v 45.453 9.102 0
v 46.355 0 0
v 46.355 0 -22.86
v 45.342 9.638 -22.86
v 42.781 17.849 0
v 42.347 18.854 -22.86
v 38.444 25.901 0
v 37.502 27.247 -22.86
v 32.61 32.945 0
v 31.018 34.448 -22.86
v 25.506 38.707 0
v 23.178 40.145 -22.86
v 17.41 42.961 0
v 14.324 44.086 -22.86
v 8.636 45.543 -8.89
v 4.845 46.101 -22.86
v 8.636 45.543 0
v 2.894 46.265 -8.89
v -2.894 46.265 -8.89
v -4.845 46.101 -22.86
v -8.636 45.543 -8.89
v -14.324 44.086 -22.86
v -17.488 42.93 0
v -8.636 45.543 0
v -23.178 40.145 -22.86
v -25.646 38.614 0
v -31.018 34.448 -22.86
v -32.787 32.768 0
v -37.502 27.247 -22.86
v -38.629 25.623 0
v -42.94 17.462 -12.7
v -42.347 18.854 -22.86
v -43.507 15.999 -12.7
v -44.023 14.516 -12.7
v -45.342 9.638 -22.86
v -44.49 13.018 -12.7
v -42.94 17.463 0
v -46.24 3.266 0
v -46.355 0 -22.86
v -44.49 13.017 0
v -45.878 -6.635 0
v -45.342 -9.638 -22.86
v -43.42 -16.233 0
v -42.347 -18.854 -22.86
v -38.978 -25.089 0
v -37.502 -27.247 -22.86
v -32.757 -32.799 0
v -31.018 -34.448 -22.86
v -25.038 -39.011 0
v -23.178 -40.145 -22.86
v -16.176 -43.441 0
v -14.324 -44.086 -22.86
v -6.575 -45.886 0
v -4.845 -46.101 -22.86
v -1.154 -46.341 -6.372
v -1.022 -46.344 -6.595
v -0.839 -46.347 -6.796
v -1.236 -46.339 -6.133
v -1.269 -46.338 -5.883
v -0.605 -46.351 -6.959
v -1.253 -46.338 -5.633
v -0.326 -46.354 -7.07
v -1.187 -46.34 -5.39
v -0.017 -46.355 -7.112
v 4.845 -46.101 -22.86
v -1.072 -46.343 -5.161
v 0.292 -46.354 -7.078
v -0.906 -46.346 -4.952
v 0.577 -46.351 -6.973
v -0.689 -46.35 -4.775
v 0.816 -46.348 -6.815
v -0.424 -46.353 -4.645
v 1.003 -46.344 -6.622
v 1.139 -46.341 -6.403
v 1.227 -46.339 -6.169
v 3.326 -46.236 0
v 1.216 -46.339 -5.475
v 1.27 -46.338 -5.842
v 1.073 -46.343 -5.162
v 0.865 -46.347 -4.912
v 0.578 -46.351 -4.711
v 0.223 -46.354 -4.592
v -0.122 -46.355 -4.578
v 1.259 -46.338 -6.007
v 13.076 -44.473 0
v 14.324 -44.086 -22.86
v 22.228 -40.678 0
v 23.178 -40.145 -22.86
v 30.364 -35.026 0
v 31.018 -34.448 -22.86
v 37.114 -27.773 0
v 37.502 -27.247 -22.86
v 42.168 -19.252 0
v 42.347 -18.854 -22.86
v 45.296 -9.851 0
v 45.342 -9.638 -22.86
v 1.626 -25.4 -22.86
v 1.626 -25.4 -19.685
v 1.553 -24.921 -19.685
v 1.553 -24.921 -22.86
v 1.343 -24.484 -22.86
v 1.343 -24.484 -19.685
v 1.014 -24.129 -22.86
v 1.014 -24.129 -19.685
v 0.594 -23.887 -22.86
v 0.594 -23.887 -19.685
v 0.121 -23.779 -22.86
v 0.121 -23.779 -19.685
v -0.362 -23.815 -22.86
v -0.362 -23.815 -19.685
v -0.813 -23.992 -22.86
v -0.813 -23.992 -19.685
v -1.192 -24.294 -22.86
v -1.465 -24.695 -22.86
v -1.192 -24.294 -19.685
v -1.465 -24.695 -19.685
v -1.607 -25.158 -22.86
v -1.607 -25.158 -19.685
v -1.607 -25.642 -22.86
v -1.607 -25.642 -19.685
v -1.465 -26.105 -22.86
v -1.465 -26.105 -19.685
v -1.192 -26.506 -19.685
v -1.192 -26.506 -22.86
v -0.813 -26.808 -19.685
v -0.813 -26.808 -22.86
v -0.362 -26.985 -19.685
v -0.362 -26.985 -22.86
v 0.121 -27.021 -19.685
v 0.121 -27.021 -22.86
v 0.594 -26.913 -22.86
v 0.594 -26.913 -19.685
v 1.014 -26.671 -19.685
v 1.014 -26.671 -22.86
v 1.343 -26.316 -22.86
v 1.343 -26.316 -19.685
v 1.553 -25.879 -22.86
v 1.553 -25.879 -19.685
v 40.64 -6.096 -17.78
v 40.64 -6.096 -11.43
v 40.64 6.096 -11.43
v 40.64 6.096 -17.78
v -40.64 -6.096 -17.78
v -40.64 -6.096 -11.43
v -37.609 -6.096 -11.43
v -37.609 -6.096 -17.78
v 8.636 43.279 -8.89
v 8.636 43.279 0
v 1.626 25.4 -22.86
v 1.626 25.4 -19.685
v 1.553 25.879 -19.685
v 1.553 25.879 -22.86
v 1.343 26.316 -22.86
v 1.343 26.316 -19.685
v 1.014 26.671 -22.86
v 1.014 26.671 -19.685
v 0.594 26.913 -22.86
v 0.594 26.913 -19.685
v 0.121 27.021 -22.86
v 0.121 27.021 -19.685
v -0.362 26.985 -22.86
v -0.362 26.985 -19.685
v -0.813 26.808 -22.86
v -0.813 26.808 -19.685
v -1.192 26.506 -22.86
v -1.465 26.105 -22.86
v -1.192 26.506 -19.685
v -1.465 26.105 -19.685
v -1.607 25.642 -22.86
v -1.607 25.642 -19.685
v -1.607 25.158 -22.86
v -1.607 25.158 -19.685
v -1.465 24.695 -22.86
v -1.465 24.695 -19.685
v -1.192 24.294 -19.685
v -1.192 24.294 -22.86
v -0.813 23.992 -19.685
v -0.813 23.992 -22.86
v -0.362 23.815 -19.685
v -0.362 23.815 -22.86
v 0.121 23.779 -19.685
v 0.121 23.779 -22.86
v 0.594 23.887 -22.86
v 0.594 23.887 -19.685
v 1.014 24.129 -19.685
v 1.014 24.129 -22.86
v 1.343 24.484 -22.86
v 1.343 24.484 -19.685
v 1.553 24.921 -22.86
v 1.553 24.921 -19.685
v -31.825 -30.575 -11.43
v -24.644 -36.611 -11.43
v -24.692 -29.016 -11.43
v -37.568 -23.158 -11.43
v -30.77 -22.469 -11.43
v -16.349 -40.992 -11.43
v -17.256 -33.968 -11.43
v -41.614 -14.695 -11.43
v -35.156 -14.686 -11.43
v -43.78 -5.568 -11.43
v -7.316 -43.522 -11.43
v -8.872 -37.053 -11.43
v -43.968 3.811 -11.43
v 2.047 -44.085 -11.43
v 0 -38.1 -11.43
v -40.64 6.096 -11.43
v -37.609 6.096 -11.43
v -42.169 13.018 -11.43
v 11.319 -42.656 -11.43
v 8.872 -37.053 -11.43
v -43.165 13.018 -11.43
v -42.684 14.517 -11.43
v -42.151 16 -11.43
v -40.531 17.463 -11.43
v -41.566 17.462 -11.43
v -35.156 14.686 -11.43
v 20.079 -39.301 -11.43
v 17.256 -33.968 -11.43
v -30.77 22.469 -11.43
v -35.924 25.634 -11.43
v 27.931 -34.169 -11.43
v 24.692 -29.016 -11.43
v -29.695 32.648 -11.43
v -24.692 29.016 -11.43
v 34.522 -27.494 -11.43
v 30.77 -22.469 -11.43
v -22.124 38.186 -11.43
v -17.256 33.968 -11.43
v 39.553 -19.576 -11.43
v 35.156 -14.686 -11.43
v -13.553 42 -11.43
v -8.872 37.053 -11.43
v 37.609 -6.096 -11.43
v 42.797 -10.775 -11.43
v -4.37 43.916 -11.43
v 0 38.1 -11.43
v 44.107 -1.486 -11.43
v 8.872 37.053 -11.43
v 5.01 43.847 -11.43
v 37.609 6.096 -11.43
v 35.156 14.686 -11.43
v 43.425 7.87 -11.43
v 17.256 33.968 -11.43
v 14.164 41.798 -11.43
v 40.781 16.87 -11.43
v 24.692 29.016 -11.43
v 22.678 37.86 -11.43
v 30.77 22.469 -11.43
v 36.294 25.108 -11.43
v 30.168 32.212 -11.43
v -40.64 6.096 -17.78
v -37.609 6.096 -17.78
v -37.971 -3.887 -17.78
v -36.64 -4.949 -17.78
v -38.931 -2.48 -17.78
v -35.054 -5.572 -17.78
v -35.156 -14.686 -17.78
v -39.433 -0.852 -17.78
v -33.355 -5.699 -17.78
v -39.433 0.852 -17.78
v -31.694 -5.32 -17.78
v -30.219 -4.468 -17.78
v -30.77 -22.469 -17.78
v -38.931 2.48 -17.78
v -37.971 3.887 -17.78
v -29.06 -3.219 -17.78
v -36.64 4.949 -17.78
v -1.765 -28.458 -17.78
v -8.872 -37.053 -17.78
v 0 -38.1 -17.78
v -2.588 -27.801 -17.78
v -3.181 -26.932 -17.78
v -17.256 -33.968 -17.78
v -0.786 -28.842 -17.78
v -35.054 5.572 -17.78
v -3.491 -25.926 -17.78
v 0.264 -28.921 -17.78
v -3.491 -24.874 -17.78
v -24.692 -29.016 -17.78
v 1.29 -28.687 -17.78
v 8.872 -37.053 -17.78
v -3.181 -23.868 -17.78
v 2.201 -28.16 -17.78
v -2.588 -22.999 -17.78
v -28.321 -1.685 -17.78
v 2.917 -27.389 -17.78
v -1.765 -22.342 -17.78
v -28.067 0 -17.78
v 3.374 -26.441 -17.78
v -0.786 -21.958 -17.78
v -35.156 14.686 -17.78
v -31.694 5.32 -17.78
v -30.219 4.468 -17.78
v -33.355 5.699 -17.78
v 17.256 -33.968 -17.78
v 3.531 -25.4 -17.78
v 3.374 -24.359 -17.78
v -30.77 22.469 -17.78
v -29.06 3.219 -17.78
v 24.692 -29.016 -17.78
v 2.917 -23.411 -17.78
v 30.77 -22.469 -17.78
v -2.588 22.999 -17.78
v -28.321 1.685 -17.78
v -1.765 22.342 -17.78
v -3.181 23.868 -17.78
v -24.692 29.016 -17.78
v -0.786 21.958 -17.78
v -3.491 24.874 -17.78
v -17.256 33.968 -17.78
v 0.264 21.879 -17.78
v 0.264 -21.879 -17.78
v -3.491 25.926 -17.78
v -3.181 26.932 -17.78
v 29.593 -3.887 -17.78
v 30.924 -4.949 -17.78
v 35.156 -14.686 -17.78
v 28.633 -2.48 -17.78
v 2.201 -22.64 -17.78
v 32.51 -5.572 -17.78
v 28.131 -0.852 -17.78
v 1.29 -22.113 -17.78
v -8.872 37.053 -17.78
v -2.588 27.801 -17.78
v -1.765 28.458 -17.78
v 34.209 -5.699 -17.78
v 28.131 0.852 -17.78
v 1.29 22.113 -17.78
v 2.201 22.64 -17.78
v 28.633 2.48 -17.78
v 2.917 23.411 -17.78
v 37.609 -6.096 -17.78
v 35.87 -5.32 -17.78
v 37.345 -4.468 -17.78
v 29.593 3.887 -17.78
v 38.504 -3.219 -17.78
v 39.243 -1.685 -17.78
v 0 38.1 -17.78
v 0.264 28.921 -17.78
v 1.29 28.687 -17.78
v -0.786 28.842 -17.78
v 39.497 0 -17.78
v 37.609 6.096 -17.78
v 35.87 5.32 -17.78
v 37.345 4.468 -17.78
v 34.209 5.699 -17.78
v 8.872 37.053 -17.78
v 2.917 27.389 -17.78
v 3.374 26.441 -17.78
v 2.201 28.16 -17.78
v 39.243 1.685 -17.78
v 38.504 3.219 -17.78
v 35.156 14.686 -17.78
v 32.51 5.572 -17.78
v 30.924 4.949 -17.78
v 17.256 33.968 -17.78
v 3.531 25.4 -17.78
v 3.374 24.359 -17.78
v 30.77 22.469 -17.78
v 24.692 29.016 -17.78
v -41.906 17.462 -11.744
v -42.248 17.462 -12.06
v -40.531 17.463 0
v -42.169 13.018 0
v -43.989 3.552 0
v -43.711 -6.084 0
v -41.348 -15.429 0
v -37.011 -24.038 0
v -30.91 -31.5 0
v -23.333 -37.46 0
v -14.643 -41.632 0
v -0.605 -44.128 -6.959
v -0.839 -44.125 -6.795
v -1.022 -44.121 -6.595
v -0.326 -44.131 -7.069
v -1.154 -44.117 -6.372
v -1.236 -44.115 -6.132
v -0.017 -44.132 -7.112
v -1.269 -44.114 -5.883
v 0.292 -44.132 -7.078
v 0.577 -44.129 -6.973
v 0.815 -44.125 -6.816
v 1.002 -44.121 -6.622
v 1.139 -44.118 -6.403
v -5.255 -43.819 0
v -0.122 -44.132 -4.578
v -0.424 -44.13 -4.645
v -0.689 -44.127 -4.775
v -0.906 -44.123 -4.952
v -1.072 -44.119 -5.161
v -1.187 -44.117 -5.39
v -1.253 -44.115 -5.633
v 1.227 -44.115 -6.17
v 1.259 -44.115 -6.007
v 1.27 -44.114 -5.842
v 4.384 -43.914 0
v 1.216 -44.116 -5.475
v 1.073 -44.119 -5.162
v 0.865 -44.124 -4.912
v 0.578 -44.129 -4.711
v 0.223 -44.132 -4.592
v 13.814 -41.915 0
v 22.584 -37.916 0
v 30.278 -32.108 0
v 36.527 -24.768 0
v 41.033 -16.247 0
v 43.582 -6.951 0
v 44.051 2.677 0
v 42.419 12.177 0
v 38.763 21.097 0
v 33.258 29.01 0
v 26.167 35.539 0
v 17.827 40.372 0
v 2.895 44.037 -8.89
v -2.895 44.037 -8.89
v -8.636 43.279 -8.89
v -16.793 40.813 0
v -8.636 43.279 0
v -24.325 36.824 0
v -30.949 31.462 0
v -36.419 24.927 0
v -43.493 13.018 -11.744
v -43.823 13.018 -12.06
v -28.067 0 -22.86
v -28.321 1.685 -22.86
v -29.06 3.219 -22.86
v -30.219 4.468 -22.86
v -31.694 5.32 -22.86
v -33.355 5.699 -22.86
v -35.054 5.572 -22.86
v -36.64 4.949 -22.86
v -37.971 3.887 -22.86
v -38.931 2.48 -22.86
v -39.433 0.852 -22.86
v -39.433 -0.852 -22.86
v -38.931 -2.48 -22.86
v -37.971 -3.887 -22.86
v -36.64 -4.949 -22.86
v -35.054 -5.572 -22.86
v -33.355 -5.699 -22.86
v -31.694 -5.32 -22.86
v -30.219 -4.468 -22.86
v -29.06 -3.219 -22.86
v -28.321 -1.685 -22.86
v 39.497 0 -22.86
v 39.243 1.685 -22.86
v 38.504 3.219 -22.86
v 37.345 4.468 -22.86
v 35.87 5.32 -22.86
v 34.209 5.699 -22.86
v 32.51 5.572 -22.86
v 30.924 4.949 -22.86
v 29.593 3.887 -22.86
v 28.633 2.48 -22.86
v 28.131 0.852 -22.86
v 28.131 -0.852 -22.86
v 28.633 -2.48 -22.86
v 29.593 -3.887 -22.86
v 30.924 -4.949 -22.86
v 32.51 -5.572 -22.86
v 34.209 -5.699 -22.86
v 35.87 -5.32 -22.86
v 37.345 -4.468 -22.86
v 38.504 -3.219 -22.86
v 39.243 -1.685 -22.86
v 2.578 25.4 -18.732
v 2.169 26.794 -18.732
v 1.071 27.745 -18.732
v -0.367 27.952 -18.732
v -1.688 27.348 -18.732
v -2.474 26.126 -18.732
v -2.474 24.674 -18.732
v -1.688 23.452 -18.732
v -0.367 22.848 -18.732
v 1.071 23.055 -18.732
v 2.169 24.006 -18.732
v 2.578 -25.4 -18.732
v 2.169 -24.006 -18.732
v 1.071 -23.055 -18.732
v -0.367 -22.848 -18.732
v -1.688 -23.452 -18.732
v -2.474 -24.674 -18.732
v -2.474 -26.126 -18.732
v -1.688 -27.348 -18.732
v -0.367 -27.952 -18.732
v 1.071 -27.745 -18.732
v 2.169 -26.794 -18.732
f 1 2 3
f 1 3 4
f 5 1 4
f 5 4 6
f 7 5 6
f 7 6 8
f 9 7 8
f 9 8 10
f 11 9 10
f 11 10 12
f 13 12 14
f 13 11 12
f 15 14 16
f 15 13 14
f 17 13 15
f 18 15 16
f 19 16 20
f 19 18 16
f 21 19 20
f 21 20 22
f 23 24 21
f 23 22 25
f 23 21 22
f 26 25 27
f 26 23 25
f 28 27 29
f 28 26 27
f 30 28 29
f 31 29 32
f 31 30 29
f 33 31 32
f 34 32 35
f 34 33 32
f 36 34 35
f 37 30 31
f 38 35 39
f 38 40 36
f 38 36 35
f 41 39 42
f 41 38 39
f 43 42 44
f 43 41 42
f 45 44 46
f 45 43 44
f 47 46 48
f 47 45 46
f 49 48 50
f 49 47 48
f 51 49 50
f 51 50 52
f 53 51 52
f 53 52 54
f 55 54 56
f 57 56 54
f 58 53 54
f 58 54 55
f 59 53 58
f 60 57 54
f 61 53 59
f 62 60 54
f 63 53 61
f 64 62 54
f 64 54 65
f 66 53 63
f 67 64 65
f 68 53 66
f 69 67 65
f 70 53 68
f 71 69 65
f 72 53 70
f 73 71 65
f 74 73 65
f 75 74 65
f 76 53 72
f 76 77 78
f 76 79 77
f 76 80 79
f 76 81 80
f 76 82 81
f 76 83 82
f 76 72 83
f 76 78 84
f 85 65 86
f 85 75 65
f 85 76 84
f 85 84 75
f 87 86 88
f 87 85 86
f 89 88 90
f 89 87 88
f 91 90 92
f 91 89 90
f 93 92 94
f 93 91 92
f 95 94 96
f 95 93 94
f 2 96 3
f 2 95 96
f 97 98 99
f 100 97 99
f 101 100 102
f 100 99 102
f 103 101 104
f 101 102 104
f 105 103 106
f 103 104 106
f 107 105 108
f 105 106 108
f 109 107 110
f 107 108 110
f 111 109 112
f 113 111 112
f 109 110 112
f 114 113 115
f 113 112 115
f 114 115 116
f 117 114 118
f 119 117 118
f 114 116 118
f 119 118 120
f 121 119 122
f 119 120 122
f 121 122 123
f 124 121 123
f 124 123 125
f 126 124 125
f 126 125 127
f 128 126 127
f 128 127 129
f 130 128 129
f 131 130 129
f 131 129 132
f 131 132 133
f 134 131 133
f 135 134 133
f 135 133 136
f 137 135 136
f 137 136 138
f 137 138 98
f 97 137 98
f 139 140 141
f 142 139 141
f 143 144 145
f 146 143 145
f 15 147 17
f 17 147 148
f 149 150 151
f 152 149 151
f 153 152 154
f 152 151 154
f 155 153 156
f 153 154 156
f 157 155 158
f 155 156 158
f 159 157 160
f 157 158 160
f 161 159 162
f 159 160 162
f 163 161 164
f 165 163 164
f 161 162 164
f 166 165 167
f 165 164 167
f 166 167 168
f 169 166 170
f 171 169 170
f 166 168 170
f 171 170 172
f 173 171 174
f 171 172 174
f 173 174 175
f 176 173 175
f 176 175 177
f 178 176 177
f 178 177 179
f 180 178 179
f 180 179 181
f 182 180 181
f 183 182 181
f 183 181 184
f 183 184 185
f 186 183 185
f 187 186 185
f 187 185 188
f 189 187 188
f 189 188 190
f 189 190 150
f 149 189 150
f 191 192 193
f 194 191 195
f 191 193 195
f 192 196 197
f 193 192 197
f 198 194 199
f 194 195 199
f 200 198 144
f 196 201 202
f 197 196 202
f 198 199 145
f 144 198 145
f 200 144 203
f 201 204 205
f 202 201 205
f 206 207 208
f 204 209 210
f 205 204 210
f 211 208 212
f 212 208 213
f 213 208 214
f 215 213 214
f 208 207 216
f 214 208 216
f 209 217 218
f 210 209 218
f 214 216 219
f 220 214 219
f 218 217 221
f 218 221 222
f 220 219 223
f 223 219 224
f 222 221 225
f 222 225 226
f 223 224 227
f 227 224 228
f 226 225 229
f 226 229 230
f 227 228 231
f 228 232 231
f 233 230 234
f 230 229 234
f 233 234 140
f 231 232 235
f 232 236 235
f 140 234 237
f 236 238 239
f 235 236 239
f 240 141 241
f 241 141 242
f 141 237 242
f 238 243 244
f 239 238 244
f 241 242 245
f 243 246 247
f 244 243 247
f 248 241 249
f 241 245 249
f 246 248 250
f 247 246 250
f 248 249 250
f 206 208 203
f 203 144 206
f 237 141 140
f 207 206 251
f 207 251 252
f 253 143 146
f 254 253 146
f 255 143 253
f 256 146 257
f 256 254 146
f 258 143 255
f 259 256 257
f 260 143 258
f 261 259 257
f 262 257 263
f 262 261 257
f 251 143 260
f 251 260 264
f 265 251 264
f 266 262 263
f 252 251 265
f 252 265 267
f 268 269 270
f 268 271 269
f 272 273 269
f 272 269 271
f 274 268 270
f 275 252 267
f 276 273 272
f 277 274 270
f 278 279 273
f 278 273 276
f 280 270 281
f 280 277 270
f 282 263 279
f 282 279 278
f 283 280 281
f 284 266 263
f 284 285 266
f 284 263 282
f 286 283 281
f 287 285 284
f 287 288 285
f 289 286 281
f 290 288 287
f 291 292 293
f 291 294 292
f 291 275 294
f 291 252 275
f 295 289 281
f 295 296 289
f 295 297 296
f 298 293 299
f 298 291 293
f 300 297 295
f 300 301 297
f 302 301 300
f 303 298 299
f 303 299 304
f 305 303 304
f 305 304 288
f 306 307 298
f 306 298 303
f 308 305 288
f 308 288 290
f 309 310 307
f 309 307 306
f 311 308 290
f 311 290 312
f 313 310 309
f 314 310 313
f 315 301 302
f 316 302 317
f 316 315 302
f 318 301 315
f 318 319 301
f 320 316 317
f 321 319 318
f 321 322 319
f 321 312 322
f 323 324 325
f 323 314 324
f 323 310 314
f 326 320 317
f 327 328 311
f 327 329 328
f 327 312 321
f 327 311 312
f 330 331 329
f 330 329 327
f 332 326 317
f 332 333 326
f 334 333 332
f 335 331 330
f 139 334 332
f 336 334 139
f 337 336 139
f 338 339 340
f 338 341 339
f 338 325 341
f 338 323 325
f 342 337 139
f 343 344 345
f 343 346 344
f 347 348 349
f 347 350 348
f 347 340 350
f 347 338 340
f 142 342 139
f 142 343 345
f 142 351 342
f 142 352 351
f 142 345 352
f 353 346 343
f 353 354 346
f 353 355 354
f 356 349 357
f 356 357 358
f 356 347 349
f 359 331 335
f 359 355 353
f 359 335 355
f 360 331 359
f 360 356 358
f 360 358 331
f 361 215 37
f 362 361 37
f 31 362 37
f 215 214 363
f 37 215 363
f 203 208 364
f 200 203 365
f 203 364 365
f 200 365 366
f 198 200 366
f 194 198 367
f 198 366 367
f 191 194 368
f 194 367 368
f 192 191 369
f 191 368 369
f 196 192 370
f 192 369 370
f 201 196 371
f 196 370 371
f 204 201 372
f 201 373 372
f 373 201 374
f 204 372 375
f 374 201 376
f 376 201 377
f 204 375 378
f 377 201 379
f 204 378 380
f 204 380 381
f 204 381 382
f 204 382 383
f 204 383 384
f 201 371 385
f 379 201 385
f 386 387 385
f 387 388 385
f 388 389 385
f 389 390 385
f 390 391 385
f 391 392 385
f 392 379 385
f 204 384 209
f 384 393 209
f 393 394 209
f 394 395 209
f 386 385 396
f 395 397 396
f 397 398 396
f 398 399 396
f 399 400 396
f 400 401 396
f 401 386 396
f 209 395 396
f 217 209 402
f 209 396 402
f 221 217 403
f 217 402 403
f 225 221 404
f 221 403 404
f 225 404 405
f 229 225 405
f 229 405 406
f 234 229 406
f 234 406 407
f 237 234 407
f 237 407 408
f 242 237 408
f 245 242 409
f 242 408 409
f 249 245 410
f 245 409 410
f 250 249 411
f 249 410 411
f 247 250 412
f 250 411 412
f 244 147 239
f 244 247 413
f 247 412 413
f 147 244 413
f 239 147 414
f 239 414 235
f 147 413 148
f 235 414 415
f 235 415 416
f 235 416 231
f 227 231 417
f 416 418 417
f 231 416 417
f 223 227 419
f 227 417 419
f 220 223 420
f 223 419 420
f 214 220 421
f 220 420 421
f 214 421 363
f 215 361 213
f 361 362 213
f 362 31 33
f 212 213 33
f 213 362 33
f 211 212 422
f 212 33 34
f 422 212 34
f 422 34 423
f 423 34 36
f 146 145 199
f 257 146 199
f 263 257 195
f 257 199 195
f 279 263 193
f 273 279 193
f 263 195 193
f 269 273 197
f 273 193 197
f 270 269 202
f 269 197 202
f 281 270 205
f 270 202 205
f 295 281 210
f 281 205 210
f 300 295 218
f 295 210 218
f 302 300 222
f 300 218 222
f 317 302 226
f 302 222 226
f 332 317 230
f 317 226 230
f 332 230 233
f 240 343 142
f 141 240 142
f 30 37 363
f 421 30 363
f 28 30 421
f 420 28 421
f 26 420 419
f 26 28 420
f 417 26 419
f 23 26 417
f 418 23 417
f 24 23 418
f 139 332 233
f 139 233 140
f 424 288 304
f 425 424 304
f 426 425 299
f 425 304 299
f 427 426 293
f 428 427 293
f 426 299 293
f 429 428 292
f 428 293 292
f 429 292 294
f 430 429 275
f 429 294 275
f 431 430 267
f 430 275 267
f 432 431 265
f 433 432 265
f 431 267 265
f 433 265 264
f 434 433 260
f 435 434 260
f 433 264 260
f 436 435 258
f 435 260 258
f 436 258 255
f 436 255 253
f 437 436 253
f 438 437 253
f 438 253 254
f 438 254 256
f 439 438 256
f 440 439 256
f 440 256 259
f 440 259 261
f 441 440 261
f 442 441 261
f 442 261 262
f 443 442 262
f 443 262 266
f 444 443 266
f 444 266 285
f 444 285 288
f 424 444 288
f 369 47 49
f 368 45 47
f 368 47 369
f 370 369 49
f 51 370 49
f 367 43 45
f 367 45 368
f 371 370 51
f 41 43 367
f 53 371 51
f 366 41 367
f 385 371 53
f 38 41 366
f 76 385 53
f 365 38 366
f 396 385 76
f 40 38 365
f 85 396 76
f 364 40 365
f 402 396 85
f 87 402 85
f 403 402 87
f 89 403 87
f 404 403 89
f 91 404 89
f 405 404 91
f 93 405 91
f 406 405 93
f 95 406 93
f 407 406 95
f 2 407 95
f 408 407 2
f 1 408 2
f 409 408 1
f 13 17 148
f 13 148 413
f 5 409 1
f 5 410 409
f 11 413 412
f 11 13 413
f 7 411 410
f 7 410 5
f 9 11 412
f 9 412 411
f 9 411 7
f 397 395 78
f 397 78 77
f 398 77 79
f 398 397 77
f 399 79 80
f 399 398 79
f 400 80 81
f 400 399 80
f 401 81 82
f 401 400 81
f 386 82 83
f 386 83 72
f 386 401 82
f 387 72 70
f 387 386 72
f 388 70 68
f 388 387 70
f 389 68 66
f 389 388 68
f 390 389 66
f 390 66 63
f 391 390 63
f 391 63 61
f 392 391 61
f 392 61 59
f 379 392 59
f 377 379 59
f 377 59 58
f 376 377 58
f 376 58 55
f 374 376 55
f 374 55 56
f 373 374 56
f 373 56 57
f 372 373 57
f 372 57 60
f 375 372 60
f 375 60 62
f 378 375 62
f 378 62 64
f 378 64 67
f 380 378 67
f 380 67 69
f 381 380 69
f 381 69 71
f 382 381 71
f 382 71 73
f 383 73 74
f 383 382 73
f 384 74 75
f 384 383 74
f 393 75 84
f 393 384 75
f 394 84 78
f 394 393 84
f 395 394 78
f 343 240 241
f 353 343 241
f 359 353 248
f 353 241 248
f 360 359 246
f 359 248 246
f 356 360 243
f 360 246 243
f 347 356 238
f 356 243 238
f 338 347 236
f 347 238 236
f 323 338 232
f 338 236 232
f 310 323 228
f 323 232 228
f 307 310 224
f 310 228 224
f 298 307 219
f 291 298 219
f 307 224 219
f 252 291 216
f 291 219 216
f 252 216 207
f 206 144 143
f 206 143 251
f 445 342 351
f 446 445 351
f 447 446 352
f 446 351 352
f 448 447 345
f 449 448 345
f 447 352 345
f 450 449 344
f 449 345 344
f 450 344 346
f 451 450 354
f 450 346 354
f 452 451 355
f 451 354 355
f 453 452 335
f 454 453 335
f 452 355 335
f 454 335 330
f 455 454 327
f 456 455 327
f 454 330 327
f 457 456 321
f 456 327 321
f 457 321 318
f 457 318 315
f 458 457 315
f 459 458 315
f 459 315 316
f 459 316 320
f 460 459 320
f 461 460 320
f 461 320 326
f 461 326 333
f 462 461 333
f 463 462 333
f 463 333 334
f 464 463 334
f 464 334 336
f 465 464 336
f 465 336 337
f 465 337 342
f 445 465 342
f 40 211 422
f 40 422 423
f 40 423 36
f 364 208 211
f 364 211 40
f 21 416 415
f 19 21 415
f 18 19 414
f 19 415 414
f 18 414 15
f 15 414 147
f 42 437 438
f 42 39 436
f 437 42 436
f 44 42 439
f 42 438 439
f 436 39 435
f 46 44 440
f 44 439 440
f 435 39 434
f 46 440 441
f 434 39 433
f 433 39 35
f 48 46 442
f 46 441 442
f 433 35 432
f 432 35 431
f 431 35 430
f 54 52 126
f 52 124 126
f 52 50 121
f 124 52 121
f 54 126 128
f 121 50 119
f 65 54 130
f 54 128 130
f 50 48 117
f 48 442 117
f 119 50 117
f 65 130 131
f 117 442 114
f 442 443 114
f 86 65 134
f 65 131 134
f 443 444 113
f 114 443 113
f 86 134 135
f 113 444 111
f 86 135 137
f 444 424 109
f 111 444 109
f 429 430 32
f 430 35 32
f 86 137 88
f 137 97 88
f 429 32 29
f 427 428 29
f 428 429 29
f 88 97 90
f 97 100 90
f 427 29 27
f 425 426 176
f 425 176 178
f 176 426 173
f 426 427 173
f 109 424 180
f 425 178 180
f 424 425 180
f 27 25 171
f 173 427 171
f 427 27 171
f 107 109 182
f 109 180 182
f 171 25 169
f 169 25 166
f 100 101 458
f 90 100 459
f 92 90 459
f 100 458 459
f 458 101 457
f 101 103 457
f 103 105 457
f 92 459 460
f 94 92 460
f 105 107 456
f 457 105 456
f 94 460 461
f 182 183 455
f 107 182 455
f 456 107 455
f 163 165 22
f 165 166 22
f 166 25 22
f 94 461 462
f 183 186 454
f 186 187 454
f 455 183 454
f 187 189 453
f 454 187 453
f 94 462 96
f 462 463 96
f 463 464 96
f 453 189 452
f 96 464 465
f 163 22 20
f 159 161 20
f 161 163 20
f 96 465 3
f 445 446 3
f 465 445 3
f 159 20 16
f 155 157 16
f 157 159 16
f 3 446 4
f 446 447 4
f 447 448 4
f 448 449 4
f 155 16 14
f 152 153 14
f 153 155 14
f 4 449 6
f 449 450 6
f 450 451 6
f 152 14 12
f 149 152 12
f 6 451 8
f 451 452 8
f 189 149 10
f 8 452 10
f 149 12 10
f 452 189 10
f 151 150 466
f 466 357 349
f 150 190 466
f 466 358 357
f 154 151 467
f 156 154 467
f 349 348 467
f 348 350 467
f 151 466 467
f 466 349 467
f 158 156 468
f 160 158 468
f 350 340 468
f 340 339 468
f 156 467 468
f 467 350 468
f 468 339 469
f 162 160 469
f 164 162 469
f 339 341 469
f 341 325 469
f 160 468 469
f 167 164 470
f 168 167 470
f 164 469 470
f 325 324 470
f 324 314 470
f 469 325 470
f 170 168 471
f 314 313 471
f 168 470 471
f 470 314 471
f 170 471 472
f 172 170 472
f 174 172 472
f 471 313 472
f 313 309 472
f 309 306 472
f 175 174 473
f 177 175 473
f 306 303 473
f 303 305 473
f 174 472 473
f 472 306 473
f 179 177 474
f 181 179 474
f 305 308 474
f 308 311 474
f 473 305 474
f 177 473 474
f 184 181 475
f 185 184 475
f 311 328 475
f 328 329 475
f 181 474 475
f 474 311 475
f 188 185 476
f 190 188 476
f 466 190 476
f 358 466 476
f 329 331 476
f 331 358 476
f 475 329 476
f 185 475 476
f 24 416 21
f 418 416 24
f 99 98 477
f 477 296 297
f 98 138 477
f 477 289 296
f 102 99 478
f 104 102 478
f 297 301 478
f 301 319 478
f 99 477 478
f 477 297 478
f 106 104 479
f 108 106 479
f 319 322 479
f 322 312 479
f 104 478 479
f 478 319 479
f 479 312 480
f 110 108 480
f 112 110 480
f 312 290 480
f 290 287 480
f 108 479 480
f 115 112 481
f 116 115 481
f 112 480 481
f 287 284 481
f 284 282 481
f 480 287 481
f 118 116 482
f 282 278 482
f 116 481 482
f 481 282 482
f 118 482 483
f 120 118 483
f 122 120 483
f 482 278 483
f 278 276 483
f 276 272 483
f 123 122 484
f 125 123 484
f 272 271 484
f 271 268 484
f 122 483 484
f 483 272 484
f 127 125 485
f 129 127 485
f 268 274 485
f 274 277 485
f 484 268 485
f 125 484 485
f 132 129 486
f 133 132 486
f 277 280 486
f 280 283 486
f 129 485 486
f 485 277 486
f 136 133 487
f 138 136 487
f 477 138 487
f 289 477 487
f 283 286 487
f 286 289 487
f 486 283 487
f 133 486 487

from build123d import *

# Parameters (mm, degrees)
F0_R      = 46.355
F1_DEPTH  = 22.86
F2_R      = 44.1325
F3_DEPTH  = 11.43
F4_R      = 38.1
F5_DEPTH  = 17.78
F6_W      = 81.28
F6_H      = 12.192
F7_DEPTH  = 17.78
F8_R      = 5.715
F9_DEPTH  = 22.861
F10_R     = 1.27
F11_DEPTH = 46.356
F12_W     = 17.272
F12_H     = 8.89
F13_DEPTH = 46.356
F14_R     = 1.6256
F15_DEPTH = 22.861
F16_SIZE  = 1.905
F17_W     = 4.445
F17_H     = 11.43
F18_DEPTH = 46.356
F19_SIZE  = 1.27


with BuildPart() as f1:
    # F0 (on Top) → F1 (new body)
    with BuildSketch(Plane.XY):
        Circle(F0_R)
    extrude(amount=-F1_DEPTH)

    # F2 (on face) → F3 (cut)
    with BuildSketch(Plane.XY):
        Circle(F2_R)
    extrude(amount=-F3_DEPTH, mode=Mode.SUBTRACT)

    # F4 (on Top) → F5 (cut)
    with BuildSketch(Plane.XY):
        Circle(F4_R)
    extrude(amount=-F5_DEPTH, mode=Mode.SUBTRACT)

    # F6 (on Top) → F7 (cut)
    with BuildSketch(Plane.XY):
        Rectangle(F6_W, F6_H)
    extrude(amount=-F7_DEPTH, mode=Mode.SUBTRACT)

    # F8 (on Top) → F9 (cut, through all)
    with BuildSketch(Plane.XY):
        with Locations((-33.782, 0)):
            Circle(F8_R)
        with Locations((33.782, 0)):
            Circle(F8_R)
    extrude(amount=-F9_DEPTH, mode=Mode.SUBTRACT)

    # F10 (on Front) → F11 (cut, through all)
    with BuildSketch(Plane.XZ):
        with Locations((0, -5.842)):
            Circle(F10_R)
    extrude(amount=F11_DEPTH, mode=Mode.SUBTRACT)

    # F12 (on Front) → F13 (cut, through all)
    with BuildSketch(Plane.XZ):
        with Locations((0, -4.445)):
            Rectangle(F12_W, F12_H)
    extrude(amount=-F13_DEPTH, mode=Mode.SUBTRACT)

    # F14 (on Top) → F15 (cut, through all)
    with BuildSketch(Plane.XY):
        with Locations((0, 25.4)):
            Circle(F14_R)
        with Locations((0, -25.4)):
            Circle(F14_R)
    extrude(amount=-F15_DEPTH, mode=Mode.SUBTRACT)

    # F16
    f16_edges = [f1.edges().sort_by_distance(p)[0] for p in [
        (-1.6256, 25.4, -17.78),
        (-1.6256, -25.4, -17.78),
    ]]
    chamfer(f16_edges, length=F16_SIZE)

    # F17 (on Right) → F18 (cut, through all)
    with BuildSketch(Plane.YZ):
        with Locations((15.24, -5.715)):
            Rectangle(F17_W, F17_H)
    extrude(amount=-F18_DEPTH, mode=Mode.SUBTRACT)

    # F19
    f19_edges = [f1.edges().sort_by_distance(p)[0] for p in [
        (-43.771316, 15.259683, -11.43),
    ]]
    chamfer(f19_edges, length=F19_SIZE)


solid = f1.part
